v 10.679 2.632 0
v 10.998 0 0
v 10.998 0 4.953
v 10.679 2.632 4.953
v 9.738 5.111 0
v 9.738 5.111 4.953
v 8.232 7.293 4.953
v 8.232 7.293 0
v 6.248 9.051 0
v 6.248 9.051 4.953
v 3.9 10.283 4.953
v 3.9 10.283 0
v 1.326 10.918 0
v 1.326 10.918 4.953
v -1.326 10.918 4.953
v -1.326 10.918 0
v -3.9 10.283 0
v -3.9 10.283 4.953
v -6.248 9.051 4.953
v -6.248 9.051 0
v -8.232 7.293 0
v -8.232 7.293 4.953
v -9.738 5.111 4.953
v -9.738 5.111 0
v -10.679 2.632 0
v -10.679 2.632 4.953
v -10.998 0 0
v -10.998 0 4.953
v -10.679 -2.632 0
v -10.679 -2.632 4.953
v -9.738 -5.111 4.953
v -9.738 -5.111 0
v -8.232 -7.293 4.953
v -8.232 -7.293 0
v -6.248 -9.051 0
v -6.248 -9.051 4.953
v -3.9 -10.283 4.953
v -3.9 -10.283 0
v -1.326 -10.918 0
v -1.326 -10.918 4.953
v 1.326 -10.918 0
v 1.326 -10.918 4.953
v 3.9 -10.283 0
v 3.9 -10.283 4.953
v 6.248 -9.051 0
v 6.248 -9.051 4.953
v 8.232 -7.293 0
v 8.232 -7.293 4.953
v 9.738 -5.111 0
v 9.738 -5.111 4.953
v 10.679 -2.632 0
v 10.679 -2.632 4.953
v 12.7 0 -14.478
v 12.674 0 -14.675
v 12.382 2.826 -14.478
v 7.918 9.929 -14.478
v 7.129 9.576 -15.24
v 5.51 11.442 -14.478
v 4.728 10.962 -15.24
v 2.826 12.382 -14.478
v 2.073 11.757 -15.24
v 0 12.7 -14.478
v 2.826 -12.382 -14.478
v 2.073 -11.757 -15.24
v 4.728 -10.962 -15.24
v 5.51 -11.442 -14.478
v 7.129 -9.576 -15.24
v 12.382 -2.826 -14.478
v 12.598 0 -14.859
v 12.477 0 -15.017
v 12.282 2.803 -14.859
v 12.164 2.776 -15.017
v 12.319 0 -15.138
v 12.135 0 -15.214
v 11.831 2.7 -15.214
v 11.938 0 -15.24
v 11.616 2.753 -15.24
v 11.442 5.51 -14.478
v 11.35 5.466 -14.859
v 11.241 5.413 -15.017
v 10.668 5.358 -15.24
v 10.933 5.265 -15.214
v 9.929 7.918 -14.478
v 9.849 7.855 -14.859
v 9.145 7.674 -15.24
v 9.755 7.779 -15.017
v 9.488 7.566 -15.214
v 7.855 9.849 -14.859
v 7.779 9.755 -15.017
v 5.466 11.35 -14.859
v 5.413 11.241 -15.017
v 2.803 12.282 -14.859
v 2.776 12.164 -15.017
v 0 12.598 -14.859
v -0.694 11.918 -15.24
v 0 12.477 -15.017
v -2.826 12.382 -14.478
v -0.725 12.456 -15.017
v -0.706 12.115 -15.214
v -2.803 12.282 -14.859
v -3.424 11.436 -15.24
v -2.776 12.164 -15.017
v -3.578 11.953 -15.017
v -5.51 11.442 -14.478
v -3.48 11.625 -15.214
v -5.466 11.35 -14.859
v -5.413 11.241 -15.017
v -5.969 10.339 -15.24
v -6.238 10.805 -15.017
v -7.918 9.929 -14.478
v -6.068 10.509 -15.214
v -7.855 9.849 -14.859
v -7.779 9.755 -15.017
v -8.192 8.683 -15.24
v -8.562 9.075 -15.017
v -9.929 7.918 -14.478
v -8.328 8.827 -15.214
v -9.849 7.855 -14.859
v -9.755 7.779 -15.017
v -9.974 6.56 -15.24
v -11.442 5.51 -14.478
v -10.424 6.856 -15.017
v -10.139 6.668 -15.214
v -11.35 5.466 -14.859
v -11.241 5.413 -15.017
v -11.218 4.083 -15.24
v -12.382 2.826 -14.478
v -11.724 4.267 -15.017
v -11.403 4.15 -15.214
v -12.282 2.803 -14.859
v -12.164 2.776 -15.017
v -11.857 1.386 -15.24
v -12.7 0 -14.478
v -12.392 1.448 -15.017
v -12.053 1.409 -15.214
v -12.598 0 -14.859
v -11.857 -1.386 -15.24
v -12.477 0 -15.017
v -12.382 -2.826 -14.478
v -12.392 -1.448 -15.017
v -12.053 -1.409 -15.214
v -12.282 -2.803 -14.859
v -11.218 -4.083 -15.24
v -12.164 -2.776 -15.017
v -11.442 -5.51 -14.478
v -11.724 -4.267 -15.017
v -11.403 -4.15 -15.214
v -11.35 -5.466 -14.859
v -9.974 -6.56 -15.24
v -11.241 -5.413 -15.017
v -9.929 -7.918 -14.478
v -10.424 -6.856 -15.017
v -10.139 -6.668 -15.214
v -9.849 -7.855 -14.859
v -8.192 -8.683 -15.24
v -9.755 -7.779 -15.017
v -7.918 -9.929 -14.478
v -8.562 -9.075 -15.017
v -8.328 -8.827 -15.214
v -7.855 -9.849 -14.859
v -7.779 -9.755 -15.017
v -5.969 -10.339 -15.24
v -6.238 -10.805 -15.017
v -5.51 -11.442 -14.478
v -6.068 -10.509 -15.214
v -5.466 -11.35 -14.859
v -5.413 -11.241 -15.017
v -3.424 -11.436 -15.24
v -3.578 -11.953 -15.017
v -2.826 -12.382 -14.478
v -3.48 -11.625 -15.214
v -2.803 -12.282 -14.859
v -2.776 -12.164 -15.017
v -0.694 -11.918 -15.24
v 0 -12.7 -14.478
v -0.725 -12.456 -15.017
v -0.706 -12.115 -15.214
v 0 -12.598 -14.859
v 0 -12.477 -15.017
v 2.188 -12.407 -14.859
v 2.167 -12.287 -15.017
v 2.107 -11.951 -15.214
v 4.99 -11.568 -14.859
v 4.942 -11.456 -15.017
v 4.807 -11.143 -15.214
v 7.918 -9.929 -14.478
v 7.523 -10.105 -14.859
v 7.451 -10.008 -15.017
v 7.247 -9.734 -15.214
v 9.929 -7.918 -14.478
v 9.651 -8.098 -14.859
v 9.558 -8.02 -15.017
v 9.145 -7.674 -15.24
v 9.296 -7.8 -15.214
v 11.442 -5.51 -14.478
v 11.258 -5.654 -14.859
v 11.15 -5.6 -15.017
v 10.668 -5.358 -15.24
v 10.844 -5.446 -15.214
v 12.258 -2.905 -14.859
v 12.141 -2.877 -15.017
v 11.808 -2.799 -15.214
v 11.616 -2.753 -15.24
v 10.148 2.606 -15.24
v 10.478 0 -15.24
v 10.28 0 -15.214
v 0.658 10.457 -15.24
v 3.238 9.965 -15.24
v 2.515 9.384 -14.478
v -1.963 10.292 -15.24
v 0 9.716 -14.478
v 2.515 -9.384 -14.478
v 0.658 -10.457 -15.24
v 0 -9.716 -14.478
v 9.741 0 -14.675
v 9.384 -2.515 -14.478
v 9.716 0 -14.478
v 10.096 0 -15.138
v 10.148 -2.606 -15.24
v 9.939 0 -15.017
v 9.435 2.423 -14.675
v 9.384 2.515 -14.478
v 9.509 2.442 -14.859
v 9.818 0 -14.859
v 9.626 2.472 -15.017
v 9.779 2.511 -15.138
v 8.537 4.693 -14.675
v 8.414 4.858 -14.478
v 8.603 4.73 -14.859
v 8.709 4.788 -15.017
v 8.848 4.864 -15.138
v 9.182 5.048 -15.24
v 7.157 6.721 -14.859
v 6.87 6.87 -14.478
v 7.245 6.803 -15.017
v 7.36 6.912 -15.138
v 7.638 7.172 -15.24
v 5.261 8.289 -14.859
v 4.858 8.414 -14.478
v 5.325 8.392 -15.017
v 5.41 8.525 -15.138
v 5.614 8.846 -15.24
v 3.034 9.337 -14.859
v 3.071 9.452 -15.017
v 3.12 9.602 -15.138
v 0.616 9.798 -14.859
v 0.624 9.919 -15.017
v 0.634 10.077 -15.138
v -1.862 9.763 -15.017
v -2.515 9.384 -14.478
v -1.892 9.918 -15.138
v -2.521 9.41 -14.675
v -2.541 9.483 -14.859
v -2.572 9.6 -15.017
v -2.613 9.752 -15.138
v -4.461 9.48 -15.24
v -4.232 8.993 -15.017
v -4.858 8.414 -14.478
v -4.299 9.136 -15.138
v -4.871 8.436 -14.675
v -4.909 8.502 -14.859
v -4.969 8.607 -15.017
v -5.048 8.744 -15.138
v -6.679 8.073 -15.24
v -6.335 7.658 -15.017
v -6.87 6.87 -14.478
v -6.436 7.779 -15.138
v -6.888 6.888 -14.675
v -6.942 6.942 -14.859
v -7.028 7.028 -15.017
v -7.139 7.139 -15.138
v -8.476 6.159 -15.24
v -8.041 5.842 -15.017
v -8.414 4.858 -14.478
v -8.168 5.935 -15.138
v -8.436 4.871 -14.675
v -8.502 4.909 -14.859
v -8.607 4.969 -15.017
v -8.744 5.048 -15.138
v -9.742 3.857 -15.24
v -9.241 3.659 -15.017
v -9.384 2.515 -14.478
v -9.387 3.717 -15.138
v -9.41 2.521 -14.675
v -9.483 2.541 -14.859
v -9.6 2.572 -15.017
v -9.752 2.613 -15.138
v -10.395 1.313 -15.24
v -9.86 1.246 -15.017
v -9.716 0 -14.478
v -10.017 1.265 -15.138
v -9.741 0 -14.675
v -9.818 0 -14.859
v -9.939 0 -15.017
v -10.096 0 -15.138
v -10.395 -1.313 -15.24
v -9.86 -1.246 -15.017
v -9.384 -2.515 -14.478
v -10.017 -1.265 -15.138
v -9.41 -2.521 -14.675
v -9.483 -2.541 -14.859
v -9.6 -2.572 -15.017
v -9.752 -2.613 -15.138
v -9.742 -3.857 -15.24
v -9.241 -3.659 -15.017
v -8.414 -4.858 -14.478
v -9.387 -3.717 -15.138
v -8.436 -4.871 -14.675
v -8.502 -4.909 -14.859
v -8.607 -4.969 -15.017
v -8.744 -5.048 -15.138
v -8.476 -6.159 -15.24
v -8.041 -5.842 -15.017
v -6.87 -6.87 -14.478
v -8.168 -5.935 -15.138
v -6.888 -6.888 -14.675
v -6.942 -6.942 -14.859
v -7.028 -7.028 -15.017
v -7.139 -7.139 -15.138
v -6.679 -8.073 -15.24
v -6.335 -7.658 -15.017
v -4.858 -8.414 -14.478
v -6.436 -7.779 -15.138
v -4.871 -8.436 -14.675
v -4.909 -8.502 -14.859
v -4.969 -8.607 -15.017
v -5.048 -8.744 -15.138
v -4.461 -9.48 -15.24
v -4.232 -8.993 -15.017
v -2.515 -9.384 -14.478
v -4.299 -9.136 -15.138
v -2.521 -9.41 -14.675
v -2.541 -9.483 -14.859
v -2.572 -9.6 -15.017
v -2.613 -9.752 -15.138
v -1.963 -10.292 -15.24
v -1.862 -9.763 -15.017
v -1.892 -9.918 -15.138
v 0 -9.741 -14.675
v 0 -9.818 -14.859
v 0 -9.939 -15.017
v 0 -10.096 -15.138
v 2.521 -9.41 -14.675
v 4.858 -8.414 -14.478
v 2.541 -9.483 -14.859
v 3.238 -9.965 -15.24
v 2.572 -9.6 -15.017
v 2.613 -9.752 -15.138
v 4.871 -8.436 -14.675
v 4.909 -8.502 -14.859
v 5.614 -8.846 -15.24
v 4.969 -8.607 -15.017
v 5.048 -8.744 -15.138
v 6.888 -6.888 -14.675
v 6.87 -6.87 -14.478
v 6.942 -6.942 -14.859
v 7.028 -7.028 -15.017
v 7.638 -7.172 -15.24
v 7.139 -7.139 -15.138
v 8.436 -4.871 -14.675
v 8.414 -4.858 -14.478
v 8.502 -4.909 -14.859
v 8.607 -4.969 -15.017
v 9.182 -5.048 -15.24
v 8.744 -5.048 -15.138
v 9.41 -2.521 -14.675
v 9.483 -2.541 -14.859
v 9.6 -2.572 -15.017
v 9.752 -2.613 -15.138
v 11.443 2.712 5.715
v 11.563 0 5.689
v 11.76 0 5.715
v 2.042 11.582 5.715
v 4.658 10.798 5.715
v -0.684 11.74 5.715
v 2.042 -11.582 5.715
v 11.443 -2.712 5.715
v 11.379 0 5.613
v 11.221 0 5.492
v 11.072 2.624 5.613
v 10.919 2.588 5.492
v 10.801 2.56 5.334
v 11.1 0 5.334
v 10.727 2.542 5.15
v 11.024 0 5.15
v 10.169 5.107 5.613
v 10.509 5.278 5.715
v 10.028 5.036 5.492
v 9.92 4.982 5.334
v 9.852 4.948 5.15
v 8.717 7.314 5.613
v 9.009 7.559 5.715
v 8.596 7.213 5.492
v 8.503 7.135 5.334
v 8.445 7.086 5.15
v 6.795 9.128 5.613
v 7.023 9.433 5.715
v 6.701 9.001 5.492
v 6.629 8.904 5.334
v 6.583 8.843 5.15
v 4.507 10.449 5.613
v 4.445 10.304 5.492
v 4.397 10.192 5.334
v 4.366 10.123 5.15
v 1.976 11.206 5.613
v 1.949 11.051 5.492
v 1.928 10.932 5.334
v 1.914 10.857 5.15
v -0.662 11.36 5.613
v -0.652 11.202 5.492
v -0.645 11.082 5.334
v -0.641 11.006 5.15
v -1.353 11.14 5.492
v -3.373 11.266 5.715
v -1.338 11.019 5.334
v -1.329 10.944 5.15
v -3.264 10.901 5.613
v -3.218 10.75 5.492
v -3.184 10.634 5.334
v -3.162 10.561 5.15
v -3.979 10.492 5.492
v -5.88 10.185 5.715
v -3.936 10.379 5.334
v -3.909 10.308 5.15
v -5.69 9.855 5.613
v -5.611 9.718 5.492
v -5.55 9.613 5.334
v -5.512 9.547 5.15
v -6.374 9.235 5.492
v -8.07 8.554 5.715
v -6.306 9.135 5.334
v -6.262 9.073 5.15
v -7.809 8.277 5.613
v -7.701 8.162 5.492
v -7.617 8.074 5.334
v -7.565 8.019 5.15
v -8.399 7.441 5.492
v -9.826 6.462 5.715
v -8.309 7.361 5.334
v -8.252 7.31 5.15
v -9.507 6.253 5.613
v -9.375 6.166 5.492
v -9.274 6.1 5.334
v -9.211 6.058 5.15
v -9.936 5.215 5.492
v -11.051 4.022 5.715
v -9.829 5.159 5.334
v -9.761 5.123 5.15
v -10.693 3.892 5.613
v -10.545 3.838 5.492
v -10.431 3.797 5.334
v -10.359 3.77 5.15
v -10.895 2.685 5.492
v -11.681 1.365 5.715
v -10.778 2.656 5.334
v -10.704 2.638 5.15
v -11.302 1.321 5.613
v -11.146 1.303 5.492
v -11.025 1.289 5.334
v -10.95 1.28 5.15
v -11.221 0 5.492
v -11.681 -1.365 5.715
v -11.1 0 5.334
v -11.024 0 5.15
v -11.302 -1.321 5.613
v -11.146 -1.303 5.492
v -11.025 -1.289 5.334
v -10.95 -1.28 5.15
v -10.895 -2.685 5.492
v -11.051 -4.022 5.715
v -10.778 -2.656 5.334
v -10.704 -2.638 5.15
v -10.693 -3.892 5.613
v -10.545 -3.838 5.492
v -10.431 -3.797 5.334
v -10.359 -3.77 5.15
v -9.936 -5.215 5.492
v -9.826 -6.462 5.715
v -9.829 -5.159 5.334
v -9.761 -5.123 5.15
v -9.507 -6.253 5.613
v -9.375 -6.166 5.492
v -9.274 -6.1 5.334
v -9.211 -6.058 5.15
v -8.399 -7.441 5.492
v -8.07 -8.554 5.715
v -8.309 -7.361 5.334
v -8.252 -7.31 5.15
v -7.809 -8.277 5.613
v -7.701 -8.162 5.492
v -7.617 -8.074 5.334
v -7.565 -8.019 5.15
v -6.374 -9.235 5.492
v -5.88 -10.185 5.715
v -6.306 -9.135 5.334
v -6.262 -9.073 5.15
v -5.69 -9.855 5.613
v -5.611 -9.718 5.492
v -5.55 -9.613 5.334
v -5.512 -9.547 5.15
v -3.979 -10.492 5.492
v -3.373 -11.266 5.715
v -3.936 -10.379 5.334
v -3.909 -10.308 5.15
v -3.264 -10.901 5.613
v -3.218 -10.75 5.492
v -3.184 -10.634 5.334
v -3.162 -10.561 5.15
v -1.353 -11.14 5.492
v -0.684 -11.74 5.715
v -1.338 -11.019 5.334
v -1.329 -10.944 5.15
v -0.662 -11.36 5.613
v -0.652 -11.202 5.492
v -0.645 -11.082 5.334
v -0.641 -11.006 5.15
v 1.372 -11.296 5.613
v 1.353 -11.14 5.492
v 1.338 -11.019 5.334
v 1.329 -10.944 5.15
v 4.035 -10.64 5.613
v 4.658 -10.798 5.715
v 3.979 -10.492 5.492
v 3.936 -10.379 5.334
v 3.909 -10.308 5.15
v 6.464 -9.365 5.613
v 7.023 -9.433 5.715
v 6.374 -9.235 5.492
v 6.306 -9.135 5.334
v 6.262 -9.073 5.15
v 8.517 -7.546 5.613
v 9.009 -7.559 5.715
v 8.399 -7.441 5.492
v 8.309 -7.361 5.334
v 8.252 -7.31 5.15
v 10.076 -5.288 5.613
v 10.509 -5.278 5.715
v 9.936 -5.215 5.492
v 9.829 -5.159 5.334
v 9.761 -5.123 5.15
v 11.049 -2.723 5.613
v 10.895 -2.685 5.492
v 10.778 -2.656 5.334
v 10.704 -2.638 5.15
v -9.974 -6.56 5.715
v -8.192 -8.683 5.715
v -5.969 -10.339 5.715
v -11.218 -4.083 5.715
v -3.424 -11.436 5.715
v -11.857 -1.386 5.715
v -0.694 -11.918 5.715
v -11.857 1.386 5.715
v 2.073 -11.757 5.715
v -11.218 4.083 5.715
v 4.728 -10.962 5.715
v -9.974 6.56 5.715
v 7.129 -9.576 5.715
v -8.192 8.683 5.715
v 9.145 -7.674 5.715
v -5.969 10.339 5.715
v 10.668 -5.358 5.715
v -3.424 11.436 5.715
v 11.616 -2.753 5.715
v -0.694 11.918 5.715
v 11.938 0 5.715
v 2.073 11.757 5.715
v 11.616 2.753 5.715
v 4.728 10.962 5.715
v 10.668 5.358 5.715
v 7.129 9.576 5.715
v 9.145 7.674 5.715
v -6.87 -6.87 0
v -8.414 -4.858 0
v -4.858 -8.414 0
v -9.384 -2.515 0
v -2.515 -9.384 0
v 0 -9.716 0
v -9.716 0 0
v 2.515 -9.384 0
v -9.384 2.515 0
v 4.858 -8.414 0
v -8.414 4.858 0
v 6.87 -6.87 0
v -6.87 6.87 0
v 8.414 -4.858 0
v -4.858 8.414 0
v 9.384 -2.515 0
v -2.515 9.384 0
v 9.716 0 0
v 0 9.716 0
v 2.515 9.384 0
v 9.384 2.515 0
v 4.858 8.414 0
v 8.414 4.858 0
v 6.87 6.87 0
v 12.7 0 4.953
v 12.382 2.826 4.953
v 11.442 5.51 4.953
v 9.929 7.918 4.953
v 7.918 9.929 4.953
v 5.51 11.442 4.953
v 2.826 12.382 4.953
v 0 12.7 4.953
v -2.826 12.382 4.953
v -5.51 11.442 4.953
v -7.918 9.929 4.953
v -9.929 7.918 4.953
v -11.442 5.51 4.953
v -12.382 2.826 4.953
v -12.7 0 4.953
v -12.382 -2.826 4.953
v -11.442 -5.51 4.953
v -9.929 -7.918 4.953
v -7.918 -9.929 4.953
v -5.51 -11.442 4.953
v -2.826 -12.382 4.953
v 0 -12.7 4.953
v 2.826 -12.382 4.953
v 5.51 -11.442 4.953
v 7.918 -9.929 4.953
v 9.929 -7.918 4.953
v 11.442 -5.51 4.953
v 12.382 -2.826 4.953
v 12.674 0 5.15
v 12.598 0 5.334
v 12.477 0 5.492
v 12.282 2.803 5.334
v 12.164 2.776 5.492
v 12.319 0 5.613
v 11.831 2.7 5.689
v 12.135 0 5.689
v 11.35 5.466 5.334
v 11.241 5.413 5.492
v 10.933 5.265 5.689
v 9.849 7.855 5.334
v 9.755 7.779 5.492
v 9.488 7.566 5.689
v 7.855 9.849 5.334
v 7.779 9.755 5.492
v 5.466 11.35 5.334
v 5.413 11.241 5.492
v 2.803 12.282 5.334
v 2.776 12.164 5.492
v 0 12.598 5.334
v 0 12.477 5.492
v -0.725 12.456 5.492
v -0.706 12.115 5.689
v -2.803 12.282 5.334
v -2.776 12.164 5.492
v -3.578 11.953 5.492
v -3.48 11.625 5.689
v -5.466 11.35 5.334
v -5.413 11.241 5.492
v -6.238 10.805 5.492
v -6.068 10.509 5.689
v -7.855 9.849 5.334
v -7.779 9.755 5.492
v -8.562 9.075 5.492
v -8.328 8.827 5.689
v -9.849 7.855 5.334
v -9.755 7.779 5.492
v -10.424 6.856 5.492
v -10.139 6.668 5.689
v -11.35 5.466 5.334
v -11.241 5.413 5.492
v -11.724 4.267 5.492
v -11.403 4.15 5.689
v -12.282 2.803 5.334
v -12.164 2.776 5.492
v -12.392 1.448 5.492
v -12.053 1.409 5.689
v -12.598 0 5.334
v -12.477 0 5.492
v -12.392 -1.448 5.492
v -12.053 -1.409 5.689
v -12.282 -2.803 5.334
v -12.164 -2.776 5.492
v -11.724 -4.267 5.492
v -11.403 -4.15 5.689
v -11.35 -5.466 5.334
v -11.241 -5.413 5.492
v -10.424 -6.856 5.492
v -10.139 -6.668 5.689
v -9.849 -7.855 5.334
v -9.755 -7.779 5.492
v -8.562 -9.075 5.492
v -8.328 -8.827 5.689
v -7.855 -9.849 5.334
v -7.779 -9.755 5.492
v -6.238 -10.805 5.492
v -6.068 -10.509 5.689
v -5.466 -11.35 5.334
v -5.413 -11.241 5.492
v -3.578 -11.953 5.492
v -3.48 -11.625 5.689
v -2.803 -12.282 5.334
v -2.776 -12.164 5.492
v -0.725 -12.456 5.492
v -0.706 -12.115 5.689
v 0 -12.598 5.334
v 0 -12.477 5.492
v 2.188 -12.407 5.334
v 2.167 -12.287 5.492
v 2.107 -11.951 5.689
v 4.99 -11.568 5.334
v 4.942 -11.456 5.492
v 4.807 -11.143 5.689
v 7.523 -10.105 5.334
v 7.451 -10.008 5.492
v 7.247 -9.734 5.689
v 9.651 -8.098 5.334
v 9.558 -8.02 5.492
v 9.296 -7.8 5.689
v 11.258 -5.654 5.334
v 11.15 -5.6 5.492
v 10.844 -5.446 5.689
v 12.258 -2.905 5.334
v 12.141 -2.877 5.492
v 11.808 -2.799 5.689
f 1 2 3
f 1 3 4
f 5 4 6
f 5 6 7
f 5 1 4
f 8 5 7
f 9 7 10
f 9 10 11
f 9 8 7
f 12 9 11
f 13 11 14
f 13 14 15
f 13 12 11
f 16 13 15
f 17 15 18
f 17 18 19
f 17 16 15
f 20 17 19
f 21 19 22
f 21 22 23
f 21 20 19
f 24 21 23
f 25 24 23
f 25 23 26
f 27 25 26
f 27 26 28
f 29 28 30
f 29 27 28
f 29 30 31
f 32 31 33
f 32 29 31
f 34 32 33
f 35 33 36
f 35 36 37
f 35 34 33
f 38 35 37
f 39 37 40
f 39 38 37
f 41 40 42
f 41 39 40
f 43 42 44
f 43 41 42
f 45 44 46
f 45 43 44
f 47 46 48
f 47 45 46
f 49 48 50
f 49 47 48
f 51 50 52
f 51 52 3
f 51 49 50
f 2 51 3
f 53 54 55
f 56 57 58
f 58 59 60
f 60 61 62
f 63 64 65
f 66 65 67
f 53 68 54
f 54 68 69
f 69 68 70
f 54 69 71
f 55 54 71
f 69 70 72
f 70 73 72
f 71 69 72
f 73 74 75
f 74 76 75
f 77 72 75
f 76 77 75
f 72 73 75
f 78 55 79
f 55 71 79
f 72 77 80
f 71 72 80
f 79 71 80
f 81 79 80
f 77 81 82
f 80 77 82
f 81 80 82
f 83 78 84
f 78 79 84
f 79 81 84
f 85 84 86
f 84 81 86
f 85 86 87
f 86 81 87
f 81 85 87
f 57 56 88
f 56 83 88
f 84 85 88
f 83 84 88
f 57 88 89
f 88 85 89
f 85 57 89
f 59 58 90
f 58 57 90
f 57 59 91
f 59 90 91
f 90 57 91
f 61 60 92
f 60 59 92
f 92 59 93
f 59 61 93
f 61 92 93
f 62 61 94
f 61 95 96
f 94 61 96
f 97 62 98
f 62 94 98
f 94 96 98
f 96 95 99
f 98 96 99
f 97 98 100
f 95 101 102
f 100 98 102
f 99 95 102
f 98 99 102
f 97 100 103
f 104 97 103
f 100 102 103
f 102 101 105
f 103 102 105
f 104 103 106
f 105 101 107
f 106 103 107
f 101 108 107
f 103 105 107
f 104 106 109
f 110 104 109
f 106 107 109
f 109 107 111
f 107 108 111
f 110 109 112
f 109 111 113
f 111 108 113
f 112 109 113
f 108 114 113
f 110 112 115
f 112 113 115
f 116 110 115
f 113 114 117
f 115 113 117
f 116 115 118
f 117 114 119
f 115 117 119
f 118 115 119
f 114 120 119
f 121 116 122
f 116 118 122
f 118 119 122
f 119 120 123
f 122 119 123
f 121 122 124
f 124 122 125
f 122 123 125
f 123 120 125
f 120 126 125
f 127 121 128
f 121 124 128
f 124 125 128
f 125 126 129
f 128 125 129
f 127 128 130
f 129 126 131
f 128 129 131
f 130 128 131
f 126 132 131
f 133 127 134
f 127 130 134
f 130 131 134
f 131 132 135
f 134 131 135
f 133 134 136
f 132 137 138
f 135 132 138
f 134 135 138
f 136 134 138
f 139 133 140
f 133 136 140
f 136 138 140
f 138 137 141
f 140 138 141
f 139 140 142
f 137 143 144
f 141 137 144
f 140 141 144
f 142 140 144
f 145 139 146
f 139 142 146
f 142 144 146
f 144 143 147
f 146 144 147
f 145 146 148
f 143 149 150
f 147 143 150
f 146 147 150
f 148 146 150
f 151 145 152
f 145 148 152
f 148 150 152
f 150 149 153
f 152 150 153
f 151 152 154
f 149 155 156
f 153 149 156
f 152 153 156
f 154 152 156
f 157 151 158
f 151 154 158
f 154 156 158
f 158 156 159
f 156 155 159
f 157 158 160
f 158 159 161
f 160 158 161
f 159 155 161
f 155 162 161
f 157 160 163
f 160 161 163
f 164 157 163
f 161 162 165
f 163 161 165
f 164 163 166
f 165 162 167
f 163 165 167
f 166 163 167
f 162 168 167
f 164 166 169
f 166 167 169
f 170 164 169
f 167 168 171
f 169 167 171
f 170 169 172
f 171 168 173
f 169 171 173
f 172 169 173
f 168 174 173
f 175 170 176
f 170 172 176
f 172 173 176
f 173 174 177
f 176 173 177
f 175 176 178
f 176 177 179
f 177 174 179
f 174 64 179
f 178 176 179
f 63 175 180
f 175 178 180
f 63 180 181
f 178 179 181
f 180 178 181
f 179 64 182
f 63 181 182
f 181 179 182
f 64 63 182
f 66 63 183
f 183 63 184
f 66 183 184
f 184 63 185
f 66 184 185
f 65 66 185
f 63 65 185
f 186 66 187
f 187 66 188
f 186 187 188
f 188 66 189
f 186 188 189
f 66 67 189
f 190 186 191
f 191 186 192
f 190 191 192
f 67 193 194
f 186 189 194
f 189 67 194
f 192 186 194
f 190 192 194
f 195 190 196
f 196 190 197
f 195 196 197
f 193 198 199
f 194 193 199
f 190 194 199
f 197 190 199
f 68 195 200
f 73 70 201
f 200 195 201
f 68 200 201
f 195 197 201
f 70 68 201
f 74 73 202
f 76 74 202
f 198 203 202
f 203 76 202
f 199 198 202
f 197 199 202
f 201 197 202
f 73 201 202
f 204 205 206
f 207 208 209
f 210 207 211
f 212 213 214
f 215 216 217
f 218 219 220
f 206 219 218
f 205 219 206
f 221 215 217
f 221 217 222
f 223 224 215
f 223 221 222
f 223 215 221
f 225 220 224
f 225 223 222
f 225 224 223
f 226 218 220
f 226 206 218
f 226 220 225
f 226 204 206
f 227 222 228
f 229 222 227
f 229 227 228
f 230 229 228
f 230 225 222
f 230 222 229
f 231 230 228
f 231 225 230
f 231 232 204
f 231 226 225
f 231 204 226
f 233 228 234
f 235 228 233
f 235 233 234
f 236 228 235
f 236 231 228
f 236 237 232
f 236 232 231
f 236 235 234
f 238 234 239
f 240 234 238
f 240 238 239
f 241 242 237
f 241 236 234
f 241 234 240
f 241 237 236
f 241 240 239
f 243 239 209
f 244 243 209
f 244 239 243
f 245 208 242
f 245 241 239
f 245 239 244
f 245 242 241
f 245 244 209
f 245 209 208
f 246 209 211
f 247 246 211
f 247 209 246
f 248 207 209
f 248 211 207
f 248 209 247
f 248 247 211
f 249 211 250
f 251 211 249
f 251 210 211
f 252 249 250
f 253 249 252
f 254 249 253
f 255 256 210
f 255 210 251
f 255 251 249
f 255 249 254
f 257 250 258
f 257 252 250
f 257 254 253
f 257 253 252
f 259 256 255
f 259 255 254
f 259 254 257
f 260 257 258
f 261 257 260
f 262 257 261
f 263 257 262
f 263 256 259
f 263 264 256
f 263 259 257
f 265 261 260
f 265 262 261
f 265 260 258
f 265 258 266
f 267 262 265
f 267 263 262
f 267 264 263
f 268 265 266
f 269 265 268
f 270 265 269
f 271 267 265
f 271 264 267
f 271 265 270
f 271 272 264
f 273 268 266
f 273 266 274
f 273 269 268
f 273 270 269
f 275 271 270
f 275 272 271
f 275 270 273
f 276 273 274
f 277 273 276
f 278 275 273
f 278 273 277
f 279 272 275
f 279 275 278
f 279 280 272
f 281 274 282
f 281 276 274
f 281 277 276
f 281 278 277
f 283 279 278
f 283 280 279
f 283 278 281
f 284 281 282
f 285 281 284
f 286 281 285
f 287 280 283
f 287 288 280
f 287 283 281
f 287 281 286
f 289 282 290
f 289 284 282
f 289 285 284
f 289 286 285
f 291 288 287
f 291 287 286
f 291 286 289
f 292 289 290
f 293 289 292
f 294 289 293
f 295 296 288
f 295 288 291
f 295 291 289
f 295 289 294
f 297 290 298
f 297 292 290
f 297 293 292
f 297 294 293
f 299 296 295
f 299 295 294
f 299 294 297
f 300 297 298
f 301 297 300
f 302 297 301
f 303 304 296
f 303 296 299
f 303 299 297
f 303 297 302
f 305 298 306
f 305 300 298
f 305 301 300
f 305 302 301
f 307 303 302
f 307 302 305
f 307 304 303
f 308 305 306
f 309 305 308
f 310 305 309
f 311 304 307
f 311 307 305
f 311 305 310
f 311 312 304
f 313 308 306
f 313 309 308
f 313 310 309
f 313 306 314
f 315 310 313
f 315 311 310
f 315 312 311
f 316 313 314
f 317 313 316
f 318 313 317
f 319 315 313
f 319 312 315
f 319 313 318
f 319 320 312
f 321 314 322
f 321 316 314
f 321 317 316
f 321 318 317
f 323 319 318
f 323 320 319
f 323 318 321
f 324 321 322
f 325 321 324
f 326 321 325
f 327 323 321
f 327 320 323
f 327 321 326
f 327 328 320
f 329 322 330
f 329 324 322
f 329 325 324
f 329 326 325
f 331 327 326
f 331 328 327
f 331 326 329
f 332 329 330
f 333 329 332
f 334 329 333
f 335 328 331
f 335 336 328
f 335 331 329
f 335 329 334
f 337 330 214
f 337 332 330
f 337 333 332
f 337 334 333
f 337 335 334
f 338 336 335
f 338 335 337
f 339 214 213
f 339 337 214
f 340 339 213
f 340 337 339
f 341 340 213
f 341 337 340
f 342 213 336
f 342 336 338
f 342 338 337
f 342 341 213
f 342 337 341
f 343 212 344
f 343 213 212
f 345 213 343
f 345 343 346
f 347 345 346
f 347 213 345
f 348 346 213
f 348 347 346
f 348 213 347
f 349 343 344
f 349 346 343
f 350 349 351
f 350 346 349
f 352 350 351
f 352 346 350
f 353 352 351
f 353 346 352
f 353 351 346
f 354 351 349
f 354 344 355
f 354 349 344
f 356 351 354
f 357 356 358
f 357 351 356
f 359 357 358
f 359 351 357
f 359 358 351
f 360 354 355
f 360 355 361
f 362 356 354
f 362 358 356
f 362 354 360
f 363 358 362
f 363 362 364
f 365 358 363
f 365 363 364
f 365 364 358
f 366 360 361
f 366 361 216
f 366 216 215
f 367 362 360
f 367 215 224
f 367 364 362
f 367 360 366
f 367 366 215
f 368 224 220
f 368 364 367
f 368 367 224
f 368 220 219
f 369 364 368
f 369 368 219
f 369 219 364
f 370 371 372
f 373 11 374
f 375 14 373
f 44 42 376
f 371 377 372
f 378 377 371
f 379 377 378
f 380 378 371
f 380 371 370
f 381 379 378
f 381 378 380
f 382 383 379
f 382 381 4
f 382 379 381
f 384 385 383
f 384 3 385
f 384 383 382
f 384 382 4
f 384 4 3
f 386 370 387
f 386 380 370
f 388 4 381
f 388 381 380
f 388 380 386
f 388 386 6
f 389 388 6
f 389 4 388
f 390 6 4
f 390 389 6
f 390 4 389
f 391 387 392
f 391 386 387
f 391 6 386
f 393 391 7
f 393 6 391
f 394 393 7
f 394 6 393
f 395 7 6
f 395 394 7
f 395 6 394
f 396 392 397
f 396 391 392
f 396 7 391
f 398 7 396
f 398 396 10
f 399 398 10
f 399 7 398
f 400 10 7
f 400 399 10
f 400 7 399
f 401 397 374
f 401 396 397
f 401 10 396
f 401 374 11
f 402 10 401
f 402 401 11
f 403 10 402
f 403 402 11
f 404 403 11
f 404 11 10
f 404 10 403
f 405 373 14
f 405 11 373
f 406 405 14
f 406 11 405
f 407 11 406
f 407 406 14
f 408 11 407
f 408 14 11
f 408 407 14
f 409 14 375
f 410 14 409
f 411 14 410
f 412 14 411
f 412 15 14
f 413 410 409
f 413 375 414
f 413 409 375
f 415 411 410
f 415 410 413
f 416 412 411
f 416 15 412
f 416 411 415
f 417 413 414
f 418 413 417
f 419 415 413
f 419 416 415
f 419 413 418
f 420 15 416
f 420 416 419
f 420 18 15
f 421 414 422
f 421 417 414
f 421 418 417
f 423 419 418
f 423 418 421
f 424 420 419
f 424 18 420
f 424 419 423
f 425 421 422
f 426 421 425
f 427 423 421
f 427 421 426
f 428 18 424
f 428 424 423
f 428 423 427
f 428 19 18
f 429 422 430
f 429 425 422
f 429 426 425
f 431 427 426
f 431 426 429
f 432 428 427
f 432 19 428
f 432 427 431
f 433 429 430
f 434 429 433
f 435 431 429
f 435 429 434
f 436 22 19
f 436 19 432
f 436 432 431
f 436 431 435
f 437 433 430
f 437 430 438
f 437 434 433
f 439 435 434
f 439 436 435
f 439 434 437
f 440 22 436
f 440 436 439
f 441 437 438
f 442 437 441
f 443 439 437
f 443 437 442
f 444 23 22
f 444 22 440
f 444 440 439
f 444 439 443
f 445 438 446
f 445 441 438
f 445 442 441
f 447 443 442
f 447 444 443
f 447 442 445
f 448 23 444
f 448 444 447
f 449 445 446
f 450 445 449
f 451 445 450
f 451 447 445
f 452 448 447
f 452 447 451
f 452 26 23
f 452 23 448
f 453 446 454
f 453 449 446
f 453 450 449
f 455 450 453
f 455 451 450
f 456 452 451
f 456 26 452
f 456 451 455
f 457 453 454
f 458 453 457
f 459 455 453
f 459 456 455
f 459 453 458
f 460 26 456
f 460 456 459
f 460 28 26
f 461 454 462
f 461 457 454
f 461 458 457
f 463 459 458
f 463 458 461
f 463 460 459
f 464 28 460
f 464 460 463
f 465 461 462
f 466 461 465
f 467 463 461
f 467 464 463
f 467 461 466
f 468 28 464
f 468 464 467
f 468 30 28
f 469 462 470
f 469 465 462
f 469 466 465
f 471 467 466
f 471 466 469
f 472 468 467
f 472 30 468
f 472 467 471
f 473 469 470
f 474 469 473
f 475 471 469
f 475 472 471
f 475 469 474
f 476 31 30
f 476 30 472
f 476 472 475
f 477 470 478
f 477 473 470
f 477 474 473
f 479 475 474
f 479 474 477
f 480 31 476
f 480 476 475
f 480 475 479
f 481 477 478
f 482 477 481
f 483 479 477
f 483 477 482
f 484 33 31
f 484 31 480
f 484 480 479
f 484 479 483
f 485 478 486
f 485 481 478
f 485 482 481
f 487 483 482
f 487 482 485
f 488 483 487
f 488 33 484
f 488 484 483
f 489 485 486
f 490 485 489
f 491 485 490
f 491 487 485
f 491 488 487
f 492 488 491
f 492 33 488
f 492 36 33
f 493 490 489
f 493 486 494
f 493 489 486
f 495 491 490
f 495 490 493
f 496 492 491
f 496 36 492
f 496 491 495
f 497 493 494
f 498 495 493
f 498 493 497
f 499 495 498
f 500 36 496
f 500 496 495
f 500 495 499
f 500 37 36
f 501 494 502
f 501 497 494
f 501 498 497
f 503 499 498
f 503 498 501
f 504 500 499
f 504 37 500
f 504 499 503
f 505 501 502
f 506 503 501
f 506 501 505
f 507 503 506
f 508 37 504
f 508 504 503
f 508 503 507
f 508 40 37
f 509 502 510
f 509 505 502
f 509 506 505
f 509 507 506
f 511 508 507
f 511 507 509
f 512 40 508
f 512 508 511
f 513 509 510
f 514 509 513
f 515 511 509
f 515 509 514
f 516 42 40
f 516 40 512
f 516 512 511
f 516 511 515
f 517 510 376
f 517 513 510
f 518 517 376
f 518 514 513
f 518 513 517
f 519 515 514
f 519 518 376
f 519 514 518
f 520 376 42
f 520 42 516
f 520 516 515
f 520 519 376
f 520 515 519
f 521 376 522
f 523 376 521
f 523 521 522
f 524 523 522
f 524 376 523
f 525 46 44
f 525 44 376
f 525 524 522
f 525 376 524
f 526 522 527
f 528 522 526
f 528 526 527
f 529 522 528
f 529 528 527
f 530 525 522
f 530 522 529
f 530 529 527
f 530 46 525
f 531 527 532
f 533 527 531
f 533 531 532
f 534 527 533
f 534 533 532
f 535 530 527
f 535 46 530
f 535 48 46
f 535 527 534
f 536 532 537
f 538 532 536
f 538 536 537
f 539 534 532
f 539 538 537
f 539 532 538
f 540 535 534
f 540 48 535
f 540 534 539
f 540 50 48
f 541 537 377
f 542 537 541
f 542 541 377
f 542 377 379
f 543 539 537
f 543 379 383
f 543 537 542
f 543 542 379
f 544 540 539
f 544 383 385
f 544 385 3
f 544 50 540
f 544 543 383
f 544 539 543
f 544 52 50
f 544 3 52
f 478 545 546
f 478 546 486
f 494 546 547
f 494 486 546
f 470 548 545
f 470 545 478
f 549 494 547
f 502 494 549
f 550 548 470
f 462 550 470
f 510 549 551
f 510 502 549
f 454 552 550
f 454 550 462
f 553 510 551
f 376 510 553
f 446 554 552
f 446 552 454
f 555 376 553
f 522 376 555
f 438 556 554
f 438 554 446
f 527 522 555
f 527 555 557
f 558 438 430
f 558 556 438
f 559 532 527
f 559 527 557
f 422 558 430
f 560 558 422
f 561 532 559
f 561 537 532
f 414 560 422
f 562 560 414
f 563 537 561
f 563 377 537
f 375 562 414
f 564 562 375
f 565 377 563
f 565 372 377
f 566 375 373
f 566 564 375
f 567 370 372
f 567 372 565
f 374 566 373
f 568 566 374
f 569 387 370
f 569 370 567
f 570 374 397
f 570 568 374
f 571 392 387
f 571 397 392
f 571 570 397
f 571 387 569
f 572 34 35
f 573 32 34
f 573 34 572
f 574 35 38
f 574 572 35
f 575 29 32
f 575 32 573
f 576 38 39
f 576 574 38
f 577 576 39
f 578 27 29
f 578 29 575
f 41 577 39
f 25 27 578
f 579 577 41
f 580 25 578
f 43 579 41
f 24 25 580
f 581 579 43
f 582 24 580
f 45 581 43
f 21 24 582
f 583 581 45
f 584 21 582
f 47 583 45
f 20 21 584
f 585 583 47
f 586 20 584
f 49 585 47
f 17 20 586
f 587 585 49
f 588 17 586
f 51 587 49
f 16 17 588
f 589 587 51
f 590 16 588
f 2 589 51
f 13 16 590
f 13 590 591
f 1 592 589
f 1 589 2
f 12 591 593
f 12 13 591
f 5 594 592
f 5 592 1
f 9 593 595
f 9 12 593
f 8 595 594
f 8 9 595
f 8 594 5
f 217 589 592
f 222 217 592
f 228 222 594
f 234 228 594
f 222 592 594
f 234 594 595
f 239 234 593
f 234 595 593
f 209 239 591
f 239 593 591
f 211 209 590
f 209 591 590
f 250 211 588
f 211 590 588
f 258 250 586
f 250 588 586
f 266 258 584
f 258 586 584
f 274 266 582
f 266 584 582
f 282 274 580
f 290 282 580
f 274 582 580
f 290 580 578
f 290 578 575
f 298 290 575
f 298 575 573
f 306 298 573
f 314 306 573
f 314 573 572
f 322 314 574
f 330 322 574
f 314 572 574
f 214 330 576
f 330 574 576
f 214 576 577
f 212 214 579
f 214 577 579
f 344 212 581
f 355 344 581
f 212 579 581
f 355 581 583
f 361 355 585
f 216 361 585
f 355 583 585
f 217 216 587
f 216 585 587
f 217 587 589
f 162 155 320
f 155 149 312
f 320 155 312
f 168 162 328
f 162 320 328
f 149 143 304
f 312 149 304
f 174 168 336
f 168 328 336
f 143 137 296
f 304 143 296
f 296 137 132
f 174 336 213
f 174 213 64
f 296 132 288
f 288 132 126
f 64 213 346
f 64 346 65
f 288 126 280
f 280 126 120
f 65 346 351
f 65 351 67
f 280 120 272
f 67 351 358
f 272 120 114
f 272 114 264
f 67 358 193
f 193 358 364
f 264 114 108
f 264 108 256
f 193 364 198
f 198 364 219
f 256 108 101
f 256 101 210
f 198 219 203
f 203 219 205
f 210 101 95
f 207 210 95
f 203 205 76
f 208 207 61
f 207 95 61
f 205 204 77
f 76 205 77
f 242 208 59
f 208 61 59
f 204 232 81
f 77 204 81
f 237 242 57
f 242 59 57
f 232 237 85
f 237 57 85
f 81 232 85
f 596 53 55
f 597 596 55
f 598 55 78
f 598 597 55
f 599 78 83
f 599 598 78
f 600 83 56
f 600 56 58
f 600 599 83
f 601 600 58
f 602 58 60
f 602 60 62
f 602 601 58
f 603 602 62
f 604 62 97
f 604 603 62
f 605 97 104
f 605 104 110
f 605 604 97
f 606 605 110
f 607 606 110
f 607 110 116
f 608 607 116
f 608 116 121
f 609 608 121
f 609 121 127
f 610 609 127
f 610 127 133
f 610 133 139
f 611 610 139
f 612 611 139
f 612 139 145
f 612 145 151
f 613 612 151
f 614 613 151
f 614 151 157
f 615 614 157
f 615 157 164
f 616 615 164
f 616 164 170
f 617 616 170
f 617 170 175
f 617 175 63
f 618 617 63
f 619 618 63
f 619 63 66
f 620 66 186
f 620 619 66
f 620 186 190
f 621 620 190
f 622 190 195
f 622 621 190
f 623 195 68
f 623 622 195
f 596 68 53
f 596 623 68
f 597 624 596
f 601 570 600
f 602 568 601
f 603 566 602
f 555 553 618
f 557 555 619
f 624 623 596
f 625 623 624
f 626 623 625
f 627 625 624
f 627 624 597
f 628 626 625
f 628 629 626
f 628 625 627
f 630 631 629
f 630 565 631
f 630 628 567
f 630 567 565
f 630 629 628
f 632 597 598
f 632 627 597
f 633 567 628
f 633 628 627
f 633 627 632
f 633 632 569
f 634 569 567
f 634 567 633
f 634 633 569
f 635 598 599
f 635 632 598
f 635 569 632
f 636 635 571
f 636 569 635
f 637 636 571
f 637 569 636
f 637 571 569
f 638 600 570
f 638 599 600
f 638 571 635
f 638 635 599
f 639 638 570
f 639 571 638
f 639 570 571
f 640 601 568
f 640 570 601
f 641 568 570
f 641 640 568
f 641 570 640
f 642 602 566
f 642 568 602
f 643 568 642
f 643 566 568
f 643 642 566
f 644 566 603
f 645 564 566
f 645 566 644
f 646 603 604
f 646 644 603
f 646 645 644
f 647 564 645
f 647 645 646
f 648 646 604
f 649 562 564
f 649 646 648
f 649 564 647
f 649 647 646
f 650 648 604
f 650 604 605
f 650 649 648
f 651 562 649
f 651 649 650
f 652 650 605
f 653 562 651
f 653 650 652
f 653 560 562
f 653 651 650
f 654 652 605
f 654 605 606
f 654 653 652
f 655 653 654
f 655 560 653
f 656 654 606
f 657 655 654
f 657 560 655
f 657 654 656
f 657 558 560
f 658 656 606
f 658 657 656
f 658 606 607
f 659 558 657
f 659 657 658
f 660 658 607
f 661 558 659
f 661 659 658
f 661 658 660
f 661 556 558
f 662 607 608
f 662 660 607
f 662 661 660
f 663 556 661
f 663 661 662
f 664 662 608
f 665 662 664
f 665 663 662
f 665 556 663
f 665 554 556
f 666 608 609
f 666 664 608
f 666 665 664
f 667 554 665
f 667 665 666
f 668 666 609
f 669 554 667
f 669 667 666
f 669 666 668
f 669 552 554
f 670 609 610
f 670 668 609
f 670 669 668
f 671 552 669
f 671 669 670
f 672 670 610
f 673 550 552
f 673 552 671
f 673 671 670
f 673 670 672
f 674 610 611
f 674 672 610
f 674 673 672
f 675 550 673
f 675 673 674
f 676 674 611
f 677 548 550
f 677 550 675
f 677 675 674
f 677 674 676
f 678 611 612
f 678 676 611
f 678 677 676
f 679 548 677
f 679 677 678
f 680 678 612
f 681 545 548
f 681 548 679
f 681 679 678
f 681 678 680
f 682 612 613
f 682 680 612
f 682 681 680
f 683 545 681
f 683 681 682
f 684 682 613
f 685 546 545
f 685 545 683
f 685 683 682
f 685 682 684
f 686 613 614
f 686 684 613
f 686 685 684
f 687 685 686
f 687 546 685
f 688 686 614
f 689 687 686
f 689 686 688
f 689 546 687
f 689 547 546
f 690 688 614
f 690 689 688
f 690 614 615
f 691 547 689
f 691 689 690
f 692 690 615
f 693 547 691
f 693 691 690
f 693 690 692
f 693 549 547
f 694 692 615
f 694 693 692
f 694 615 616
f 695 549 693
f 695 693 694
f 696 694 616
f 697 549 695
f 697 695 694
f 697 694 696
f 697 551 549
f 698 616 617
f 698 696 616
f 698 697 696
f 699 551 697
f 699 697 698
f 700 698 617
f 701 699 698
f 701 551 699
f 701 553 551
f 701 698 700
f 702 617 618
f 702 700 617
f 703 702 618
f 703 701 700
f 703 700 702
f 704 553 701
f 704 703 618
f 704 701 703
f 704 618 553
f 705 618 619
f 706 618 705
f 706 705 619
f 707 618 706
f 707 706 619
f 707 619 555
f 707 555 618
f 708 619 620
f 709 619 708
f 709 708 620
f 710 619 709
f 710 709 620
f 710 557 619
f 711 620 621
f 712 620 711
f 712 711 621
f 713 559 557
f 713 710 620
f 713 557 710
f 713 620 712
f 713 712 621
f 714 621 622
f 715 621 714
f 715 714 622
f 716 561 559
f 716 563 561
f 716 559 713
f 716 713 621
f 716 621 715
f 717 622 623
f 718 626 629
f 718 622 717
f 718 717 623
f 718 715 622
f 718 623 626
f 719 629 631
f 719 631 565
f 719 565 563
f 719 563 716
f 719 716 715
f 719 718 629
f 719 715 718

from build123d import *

# Parameters (mm, degrees)
F0_R     = 12.7
F0_R_2   = 10.9982
F1_DEPTH = 5.715
F0_R_3   = 9.7155
F2_DEPTH = 15.24
F3_R     = 0.762


with BuildPart() as f1:
    # F0 (on Top) → F1 (new body)
    with BuildSketch(Plane.XY):
        Circle(F0_R)
        Circle(F0_R_2, mode=Mode.SUBTRACT)
    extrude(amount=F1_DEPTH)

    # F0 (on Top) → F2 (join)
    with BuildSketch(Plane.XY):
        Circle(F0_R)
        Circle(F0_R_2, mode=Mode.SUBTRACT)
        Circle(F0_R_2)
        Circle(F0_R_3, mode=Mode.SUBTRACT)
    extrude(amount=-F2_DEPTH)

    # F3
    f3_edges = [f1.edges().sort_by_distance(p)[0] for p in [
        (-9.7155, 0, -15.24),
        (-12.7, 0, -15.24),
        (-12.7, 0, 5.715),
        (-10.9982, 0, 5.715),
    ]]
    fillet(f3_edges, radius=F3_R)


solid = f1.part
